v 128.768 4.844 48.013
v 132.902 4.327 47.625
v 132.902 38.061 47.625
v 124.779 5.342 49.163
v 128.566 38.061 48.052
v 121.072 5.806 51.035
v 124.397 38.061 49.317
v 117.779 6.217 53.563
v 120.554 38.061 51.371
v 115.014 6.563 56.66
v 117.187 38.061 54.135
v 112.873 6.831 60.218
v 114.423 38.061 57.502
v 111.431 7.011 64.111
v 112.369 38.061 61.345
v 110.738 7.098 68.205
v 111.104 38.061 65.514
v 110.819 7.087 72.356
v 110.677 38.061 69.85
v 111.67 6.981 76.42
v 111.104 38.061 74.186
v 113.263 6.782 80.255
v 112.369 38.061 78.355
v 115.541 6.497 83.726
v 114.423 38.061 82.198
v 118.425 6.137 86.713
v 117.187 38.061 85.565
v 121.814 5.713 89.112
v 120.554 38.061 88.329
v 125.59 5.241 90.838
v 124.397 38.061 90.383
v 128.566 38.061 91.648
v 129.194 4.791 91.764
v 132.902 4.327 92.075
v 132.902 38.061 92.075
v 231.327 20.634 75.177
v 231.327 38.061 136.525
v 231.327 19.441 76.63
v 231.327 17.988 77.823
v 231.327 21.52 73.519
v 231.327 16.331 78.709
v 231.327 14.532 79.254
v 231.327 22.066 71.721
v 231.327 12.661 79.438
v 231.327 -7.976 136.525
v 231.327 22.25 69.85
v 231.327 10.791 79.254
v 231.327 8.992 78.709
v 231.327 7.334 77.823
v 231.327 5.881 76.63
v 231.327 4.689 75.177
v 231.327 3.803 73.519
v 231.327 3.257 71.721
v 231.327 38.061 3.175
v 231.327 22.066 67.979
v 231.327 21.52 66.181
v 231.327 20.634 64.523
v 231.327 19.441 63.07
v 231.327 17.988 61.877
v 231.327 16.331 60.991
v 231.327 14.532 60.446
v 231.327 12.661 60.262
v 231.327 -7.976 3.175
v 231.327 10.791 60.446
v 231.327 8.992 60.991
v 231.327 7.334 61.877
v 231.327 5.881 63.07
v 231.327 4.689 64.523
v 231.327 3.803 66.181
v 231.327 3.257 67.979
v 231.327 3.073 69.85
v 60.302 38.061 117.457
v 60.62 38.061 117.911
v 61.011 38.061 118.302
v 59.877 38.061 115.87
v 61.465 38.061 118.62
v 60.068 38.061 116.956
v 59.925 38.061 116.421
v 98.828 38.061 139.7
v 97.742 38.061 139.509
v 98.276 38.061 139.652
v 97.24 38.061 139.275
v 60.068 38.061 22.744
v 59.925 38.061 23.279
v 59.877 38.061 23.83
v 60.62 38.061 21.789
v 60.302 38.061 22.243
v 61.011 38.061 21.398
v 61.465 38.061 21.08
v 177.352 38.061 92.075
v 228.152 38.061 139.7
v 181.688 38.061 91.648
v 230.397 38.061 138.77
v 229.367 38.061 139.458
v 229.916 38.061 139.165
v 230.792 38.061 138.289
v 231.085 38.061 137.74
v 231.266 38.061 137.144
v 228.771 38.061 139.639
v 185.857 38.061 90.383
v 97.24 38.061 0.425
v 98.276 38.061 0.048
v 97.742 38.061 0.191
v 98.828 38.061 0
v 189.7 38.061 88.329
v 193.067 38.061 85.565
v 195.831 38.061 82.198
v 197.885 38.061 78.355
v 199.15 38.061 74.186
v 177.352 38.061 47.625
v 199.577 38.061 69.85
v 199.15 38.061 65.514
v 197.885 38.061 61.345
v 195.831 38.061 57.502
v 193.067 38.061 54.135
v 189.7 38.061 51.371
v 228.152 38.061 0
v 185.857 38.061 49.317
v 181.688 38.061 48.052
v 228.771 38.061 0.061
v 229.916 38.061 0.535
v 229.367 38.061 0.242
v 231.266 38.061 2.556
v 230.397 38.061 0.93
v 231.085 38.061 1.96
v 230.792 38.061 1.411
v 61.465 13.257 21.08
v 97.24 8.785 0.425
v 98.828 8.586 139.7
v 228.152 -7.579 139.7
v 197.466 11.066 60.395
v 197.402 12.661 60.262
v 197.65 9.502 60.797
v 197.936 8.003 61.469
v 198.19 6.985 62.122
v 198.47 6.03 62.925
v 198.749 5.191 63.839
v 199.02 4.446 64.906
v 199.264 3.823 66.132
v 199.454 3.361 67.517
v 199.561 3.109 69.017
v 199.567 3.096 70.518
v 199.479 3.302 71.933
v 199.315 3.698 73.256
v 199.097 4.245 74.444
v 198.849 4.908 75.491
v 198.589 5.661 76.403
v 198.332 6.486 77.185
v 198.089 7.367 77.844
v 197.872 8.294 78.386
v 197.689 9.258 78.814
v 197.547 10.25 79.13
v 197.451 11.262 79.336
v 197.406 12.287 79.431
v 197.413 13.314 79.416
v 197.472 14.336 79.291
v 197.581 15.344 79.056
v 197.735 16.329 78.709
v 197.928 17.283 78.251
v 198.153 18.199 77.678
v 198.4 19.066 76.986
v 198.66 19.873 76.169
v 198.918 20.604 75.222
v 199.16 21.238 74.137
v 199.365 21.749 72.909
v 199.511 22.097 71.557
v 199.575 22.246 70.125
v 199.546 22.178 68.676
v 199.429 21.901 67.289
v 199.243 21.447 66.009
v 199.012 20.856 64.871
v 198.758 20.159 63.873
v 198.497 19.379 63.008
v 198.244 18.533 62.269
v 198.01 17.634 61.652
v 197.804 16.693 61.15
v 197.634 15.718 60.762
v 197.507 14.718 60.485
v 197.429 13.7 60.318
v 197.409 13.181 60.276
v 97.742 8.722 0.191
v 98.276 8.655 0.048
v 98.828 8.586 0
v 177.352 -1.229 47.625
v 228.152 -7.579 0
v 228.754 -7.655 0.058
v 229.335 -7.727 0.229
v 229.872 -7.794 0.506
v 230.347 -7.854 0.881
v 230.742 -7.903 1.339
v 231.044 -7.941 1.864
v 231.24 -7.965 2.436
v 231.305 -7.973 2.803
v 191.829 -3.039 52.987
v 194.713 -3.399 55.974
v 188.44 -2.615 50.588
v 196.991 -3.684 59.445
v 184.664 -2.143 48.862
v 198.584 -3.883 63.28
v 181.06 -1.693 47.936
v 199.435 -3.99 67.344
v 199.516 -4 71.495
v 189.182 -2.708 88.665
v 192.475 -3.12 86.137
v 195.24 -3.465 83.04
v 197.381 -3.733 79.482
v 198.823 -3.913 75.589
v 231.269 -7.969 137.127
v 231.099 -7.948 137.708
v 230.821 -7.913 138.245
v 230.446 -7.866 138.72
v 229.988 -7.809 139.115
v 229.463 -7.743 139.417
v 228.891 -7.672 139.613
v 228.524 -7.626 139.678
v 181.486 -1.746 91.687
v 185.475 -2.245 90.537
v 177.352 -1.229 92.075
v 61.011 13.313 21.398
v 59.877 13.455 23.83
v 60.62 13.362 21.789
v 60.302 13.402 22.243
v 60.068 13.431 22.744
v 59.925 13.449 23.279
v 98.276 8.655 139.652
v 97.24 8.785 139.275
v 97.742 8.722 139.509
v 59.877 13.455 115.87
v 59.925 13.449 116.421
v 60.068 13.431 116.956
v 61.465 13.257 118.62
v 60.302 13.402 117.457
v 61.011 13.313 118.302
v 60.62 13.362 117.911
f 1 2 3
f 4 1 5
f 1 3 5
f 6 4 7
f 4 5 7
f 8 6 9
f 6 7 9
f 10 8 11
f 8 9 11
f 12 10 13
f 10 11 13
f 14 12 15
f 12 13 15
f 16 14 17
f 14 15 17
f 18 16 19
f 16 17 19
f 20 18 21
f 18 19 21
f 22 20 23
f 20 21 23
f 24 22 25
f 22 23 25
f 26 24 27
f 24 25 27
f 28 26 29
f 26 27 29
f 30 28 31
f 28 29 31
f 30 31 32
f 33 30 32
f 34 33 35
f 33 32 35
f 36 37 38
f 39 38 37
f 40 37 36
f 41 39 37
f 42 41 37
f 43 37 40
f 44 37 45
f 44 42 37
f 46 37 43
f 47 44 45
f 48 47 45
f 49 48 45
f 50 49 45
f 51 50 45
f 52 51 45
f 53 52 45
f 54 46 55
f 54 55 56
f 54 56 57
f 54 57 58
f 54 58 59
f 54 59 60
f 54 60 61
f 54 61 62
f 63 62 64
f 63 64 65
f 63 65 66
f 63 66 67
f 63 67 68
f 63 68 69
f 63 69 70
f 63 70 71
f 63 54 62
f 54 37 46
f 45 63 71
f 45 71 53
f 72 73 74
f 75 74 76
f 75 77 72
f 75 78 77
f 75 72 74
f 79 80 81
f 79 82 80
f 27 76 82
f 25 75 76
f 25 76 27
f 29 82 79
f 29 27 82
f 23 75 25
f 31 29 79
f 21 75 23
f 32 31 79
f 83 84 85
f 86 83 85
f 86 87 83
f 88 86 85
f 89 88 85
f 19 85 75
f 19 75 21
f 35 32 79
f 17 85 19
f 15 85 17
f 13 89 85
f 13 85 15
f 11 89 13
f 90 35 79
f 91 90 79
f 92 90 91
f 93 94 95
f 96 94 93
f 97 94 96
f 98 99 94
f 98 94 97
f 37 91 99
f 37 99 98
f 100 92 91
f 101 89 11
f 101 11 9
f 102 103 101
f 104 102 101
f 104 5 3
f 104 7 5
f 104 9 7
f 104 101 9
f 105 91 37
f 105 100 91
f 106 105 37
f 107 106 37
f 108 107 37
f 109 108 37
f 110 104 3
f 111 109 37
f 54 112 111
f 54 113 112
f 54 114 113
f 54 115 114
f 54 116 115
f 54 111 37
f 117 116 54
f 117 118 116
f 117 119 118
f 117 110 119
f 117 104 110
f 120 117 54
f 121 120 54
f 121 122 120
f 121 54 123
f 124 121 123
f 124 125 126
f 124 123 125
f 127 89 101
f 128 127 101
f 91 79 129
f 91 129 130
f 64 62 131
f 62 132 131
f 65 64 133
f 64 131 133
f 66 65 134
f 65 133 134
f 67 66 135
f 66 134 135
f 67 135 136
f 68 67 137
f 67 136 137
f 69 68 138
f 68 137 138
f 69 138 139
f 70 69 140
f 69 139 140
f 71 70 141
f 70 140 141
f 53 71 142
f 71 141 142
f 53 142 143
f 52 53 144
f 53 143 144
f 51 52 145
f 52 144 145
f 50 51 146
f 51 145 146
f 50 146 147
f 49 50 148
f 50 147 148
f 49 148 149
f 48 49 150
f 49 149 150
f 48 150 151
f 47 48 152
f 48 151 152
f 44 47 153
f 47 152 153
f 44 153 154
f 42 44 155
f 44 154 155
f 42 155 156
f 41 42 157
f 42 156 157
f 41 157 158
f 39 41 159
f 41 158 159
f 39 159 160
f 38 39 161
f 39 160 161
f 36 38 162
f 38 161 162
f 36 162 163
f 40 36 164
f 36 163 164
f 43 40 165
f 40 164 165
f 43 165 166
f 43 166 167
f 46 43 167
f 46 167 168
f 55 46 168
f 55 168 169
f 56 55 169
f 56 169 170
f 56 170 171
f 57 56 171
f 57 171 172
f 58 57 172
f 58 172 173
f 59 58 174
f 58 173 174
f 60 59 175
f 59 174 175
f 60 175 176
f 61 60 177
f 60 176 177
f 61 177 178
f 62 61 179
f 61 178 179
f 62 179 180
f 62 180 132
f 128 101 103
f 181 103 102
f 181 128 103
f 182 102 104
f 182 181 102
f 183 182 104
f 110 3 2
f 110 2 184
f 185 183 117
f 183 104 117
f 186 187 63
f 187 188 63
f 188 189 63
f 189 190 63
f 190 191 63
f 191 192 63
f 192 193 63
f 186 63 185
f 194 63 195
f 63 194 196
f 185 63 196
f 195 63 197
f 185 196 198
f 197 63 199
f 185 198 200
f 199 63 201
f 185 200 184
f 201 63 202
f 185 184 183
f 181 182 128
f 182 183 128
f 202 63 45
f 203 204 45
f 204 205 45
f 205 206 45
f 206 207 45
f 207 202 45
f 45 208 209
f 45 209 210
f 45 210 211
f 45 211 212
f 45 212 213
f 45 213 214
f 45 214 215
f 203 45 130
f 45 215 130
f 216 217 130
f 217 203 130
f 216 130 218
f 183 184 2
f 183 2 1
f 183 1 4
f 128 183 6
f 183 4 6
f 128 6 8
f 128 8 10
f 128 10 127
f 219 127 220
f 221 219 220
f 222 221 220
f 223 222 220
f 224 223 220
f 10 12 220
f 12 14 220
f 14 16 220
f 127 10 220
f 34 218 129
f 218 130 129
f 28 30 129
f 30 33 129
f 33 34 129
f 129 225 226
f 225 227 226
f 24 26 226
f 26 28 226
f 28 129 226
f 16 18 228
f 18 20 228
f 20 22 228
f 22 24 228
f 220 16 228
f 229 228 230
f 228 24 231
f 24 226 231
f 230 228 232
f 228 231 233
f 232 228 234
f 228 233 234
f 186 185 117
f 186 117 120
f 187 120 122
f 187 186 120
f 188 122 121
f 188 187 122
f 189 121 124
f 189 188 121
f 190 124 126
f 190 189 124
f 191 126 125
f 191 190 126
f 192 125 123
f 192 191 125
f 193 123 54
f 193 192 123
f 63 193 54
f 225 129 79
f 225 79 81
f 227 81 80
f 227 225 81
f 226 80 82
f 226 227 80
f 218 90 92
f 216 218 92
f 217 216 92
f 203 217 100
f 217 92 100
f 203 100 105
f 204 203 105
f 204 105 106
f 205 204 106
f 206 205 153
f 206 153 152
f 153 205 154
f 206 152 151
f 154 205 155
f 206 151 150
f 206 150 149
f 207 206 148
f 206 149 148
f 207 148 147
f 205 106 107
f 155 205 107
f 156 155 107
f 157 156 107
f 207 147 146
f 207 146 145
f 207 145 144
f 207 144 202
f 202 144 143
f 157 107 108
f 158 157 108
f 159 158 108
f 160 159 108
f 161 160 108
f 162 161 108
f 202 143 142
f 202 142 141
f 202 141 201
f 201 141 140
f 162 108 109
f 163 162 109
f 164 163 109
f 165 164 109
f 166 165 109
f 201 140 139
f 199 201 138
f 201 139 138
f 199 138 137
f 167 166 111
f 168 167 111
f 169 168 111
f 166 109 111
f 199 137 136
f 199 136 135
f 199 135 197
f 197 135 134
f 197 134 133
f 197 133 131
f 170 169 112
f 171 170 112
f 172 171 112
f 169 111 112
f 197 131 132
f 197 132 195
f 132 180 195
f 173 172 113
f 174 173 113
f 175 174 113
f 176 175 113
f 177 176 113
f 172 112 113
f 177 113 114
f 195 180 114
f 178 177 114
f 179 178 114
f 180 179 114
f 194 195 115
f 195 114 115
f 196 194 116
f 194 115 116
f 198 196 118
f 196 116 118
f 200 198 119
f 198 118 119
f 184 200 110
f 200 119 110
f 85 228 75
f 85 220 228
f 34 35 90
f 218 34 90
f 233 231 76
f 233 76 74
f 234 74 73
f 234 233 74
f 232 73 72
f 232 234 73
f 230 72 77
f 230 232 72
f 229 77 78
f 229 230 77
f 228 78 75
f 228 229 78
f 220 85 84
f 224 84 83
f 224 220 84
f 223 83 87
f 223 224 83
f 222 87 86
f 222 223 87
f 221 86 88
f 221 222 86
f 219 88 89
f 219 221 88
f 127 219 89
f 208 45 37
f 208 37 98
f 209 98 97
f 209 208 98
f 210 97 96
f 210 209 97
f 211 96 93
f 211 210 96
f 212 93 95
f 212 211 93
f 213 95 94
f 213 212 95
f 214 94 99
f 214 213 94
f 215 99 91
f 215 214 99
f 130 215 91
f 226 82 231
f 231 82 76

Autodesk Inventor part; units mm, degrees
ref_plane "YZ Plane" through (0, 0, 0) normal (1, 0, 0) x (0, 1, 0)
ref_plane "XZ Plane" through (0, 0, 0) normal (0, 1, 0) x (-1, 0, 0)
ref_plane "XY Plane" through (0, 0, 0) normal (0, 0, 1) x (1, 0, 0)
sketch "Sketch5" plane through (0, 0, 0) normal (0, 0, 1) x (1, 0, 0)
  line L0 (59.877, 38.0614) -> (231.327, 38.0614)
  line L1 (231.327, 38.0614) -> (231.327, -7.9761)
  line L2 (231.327, -7.9761) -> (59.877, -7.9761)
  line L3 (59.877, -7.9761) -> (59.877, 38.0614)
  dimension "d28" = 46.0375
  dimension "d29" = 171.45
extrude "Extrusion4" add sketch "Sketch5" along normal blind 139.7
sketch "Sketch6" plane through (0, 0, 139.7) normal (0, 0, 1) x (1, 0, 0)
  line L0 (231.327, 38.0614) -> (231.327, -7.9761) projected
  line L1 (231.327, -7.9761) -> (59.877, -7.9761) projected
  line L2 (231.327, -7.9761) -> (-73.473, 30.1239)
  line L3 (-73.473, 30.1239) -> (-73.473, -7.9761)
  line L4 (59.877, -7.9761) -> (-73.473, -7.9761)
  dimension "d32" = 304.8
  dimension "d33" = 38.1
extrude "Extrusion5" cut sketch "Sketch6" against normal through all
sketch "Sketch7" plane through (59.877, 38.0614, 0) normal (0, 1, 0) x (1, 0, 0)
  line L0 (0, -139.7) -> (171.45, -139.7) projected
  line L1 (0, 0) -> (0, -139.7) projected
  arc A0 (73.025, -47.625) -> (73.025, -92.075) centre (73.025, -69.85) ccw
  arc A1 (117.475, -92.075) -> (117.475, -47.625) centre (117.475, -69.85) ccw
  line L2 (73.025, -92.075) -> (117.475, -92.075)
  line L3 (73.025, -47.625) -> (117.475, -47.625)
  dimension "d36" = 69.85
  dimension "d37" = 22.225
  dimension "d38" = 73.025
  dimension "d39" = 44.45
extrude "Extrusion6" cut sketch "Sketch7" against normal through all
sketch "Sketch8" plane through (59.877, 38.0614, 0) normal (0, 1, 0) x (1, 0, 0)
  line L0 (0, -139.7) -> (171.45, -139.7) projected
  line L1 (0, 0) -> (171.45, 0) projected
  line L2 (0, 0) -> (0, -139.7) projected
  line L3 (38.1, -139.7) -> (0, -117.703)
  line L4 (0, -21.997) -> (38.1, 0)
  dimension "d42" = 30
  dimension "d43" = 38.1
  dimension "d56" = 30
extrude "Extrusion7" cut sketch "Sketch8" against normal through all
sketch "Sketch9" plane through (231.327, 38.0614, 139.7) normal (1, 0, 0) x (0, 0, -1)
  line L0 (0, 0) -> (0, -46.0375) projected
  line L1 (139.7, 0) -> (0, 0) projected
  point P0 (69.85, -25.4)
  dimension "d46" = 69.85
  dimension "d47" = 25.4
hole "Hole2" at (231.327, 12.6614, 69.85) direction (-1, 0, 0) diameter 19.177 end up to surface thread size "7/8-9 UNC" class "1B" standard "ANSI Unified Screw Threads"
fillet "Fillet2" radius 3.175 6 edges at (97.977, 23.377, 139.7) (59.877, 25.7583, 117.703) (59.877, 25.7583, 21.997) (97.977, 23.377, 0) (231.327, 15.0427, 0) (231.327, 15.0427, 139.7)
properties part number "Wedge"
